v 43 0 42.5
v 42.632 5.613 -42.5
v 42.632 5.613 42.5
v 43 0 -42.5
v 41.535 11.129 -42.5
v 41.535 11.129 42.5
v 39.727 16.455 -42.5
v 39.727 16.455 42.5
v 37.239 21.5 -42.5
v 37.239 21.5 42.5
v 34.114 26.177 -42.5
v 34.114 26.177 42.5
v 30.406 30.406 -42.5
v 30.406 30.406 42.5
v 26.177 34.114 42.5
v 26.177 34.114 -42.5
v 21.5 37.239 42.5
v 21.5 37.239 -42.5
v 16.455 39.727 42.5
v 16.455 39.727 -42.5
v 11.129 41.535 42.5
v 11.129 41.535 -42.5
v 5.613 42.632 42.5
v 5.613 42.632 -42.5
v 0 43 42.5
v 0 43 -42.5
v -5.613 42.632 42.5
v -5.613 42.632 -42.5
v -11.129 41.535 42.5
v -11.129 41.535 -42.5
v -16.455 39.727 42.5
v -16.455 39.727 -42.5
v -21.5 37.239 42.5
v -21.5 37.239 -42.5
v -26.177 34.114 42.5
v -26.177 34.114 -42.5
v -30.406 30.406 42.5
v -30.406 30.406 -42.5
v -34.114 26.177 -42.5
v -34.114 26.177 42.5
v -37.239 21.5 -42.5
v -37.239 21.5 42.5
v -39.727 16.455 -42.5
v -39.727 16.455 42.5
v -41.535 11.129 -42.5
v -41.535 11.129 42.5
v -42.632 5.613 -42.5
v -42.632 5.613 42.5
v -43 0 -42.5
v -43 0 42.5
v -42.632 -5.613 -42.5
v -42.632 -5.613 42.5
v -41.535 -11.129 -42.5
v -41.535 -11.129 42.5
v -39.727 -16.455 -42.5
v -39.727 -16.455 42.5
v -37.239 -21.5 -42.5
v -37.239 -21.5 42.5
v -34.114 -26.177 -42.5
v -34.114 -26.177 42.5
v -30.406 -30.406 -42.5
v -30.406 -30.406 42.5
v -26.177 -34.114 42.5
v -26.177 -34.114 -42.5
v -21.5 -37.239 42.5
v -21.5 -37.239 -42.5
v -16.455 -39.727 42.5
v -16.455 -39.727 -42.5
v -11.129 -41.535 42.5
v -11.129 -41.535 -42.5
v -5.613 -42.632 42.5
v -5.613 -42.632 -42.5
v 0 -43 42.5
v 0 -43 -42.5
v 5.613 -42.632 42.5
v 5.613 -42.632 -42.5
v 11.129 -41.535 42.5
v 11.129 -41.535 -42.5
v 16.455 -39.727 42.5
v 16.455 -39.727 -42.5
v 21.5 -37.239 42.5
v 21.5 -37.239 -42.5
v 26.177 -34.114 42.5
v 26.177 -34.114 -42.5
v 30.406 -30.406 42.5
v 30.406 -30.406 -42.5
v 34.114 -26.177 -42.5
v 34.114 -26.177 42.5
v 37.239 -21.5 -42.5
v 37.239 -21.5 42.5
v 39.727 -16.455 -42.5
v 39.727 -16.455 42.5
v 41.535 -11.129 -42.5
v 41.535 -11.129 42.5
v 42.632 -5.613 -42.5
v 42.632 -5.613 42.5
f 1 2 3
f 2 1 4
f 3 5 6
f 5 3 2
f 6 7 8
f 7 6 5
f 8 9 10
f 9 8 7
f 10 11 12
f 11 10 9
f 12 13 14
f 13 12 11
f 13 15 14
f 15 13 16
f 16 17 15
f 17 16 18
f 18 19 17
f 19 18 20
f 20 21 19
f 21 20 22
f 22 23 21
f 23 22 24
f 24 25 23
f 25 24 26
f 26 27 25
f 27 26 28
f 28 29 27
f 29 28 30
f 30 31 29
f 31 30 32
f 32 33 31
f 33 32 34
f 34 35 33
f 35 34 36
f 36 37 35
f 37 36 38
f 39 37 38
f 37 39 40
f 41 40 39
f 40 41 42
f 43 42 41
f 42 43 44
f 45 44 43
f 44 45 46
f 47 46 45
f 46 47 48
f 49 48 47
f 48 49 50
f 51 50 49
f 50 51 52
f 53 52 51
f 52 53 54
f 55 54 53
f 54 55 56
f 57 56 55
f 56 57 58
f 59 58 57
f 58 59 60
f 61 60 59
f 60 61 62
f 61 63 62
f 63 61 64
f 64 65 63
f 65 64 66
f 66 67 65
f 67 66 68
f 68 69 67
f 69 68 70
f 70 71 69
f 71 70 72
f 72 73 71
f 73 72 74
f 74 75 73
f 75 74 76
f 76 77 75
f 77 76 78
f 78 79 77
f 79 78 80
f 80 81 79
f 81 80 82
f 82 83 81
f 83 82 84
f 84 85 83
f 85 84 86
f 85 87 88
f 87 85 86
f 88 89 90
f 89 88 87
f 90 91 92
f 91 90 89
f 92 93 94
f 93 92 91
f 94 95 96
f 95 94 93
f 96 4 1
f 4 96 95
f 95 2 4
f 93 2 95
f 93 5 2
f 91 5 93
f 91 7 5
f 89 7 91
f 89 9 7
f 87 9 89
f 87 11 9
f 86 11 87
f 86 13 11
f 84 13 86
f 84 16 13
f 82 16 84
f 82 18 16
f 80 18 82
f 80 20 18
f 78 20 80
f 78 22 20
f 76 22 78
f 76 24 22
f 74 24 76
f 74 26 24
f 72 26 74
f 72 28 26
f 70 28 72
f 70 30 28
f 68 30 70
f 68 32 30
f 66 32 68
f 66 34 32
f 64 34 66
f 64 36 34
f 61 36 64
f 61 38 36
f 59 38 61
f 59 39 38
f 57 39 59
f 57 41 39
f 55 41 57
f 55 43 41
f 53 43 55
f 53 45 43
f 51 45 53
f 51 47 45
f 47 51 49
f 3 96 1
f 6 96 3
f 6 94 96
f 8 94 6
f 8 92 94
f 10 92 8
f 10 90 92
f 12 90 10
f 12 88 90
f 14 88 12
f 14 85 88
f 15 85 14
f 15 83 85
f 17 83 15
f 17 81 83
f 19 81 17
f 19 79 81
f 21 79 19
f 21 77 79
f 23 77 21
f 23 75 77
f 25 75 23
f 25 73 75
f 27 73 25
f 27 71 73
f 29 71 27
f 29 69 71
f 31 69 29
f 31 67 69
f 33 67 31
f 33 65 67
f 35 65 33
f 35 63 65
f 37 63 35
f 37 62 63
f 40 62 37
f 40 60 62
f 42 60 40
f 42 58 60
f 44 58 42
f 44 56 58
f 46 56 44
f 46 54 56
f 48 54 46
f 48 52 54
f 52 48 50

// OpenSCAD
// ========================================
// a cylinder with radius 4.3 cm and height 8.5 cm
// NeuroCAD canonical IR; dimensions are millimetres
// ========================================
$fn = 48;

cylinder(r=43, h=85, center=true);
